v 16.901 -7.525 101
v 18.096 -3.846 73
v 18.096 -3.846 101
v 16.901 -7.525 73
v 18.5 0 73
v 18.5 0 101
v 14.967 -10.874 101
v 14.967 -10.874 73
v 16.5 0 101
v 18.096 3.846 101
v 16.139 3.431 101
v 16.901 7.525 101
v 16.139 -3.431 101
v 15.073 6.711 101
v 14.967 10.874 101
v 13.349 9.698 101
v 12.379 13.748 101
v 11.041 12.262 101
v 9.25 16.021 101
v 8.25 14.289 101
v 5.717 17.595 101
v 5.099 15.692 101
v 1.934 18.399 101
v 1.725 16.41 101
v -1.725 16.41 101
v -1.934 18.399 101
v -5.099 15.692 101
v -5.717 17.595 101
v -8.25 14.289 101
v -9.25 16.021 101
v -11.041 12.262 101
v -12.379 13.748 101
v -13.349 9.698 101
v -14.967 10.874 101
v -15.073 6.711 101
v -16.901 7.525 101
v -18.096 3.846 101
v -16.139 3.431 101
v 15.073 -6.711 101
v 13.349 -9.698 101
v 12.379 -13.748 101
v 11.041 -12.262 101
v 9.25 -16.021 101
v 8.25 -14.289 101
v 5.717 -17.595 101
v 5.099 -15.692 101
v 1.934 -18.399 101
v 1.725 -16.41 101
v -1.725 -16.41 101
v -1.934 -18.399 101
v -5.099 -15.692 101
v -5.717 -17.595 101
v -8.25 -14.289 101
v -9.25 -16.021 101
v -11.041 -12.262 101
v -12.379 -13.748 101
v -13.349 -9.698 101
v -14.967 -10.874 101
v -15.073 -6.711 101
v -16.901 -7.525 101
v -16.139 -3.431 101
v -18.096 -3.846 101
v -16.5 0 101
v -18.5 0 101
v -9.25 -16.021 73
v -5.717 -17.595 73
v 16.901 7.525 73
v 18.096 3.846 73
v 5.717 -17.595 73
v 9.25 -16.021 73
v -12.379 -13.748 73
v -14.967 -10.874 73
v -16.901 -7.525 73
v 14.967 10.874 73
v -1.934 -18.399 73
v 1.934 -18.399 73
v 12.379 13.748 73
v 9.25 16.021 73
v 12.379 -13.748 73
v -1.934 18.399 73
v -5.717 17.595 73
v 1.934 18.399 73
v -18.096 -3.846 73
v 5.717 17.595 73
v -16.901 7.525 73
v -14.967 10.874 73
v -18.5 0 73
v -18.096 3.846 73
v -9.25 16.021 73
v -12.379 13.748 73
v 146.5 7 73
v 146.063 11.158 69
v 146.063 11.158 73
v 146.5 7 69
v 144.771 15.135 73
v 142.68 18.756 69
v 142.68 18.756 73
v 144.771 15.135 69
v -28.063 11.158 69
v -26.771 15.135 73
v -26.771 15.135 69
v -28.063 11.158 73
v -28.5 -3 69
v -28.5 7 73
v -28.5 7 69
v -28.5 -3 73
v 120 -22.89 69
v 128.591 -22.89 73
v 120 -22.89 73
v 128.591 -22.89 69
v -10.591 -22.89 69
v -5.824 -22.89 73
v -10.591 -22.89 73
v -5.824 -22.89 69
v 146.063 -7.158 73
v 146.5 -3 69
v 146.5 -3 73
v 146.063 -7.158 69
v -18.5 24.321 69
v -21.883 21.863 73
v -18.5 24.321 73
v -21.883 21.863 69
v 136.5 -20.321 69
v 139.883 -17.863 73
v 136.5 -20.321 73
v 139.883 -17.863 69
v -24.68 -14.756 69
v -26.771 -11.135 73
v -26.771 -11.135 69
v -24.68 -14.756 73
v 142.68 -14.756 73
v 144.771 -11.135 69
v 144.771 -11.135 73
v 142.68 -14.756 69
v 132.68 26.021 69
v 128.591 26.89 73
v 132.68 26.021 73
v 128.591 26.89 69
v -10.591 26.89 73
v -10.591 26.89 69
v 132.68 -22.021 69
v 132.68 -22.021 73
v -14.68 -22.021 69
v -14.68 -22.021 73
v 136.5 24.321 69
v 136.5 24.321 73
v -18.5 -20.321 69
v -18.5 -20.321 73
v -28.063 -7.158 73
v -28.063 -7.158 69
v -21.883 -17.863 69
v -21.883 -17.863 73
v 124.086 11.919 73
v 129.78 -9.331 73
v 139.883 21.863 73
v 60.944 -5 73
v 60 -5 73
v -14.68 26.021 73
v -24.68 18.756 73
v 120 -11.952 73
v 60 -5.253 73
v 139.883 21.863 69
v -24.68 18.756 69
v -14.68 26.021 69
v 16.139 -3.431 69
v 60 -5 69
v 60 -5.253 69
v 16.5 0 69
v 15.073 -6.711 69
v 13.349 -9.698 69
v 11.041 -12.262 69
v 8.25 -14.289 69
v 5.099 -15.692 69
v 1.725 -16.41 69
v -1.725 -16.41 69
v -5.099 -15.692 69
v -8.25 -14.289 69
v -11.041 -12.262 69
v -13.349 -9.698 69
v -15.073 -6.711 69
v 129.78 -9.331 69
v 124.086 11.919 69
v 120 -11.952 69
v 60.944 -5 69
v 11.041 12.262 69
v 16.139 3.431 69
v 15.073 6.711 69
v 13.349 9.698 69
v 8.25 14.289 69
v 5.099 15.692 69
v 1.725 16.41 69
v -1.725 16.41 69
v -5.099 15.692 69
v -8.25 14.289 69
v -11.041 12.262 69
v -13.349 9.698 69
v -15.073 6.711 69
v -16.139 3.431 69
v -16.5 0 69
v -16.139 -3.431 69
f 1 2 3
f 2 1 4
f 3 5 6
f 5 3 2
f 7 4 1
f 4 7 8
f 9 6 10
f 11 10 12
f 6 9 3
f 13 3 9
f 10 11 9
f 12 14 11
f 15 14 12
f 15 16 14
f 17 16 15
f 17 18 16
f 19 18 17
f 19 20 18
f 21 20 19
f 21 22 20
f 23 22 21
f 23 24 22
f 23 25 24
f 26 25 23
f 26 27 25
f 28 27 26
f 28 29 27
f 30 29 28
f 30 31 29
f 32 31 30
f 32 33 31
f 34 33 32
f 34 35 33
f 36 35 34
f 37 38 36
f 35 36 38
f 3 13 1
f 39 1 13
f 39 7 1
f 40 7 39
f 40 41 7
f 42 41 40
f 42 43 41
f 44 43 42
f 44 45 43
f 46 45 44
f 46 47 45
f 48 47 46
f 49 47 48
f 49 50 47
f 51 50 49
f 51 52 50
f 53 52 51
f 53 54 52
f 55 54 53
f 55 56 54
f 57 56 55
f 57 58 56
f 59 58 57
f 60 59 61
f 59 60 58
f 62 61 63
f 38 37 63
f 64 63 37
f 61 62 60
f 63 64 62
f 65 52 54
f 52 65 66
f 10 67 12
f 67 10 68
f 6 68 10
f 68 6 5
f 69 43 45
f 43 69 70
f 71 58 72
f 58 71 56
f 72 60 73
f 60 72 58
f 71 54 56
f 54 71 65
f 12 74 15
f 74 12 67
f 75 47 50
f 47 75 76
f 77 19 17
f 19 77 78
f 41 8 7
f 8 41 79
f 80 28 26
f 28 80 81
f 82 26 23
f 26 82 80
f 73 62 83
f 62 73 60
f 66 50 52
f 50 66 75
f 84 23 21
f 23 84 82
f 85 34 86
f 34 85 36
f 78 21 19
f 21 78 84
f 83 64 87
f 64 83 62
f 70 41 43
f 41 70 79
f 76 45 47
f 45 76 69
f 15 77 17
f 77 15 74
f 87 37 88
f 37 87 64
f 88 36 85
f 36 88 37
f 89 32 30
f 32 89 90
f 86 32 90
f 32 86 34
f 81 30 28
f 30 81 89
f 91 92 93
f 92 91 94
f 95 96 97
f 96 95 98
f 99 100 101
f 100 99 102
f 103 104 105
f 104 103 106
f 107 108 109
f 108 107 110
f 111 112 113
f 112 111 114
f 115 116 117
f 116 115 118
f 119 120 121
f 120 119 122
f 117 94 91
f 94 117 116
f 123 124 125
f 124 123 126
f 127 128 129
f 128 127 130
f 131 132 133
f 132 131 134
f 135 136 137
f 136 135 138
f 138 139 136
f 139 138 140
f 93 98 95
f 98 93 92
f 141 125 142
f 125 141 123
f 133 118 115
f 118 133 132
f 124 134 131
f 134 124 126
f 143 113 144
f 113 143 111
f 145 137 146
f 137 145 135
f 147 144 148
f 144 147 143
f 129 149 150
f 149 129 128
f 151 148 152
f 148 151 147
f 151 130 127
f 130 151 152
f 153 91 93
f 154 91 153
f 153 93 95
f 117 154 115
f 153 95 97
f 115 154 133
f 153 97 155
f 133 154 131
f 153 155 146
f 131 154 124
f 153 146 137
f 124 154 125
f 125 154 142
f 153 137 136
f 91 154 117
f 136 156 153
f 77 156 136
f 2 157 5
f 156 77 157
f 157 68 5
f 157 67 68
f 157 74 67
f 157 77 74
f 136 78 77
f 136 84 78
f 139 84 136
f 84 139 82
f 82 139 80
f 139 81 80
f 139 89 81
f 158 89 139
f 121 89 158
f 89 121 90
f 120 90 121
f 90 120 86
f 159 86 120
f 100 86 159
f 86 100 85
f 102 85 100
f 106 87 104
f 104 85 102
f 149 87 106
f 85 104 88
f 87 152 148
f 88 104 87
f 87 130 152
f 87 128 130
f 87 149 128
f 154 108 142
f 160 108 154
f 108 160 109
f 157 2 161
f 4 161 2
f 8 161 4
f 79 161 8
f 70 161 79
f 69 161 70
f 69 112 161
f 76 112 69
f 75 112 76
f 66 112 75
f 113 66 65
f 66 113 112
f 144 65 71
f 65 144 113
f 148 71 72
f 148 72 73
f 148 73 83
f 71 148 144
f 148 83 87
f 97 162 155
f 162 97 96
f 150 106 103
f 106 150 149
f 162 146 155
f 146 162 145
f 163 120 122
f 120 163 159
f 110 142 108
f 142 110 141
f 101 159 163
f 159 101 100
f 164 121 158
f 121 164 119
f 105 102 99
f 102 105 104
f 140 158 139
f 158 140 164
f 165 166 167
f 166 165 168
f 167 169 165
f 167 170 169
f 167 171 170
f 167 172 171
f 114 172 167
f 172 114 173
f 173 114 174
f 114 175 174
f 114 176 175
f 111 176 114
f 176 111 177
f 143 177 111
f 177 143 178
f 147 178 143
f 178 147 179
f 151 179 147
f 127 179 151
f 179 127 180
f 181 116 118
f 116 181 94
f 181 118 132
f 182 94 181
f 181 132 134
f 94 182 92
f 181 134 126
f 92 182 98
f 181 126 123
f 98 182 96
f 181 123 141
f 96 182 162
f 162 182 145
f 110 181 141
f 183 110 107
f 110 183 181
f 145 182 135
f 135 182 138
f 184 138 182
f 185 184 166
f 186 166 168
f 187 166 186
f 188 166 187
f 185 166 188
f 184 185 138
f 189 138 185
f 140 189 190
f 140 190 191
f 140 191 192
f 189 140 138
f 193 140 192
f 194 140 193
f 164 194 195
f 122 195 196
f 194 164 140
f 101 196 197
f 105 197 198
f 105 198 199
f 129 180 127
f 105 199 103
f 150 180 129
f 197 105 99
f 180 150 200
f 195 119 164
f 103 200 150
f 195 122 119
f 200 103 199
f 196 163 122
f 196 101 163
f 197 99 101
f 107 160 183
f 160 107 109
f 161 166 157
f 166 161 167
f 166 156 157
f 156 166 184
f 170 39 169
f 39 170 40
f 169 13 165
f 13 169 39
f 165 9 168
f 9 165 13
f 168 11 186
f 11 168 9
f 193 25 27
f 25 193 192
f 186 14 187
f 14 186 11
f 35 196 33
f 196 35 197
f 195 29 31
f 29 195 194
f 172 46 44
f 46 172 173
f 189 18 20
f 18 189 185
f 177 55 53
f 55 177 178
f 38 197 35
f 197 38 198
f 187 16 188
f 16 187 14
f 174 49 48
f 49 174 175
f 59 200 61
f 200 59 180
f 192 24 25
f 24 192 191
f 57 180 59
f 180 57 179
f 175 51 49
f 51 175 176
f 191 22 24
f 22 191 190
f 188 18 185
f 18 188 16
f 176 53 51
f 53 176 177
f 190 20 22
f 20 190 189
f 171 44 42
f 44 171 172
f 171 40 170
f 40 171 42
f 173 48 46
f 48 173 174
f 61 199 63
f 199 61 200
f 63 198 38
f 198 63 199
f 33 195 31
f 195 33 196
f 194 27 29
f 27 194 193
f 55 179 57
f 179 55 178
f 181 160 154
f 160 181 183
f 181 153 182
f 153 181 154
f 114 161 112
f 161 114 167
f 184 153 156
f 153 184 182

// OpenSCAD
handlebarR=33/2;
baseThickness=2;
sideThickness=4;
holderL=175;
holderSideWidth=30;
holderSideHeight=50;
holderWidth=112;
tabletH=22;
tabletW=260;
tabletL=180; 

module tablet() {
  cube([tabletL,tabletW,tabletH],center=true);
}

module holderSide() {
  difference() {
  minkowski() {
    difference() {
      union() {
        cylinder(r=handlebarR+baseThickness,h=holderSideWidth);
        translate([holderL/2-(handlebarR+baseThickness+10),0,0]) 
          minkowski() {
            translate([0,-2,0]) cube([holderL-40,holderSideHeight-40,sideThickness],center=true);
            cylinder(r=20,h=0.0001);
          }
      }
      #translate([90,30,0]) cube([60,50,50],center=true);
      #cylinder(r=handlebarR,h=100,center=true);
    }
  }
    cylinder(r=2,h=0.001);  
}
}

module mirrorObject() {
  	translate([0,0,holderWidth/2+holderSideWidth/2]) holderSide();
}



rotate([90,0,0]) difference() {
  rotate([90,0,0]) {
/*    mirrorObject();*/
    mirror([0,0,1]) mirrorObject();
  }
  #translate([130-tabletL/2,0,22]) rotate([0,15,0]) tablet();
}
